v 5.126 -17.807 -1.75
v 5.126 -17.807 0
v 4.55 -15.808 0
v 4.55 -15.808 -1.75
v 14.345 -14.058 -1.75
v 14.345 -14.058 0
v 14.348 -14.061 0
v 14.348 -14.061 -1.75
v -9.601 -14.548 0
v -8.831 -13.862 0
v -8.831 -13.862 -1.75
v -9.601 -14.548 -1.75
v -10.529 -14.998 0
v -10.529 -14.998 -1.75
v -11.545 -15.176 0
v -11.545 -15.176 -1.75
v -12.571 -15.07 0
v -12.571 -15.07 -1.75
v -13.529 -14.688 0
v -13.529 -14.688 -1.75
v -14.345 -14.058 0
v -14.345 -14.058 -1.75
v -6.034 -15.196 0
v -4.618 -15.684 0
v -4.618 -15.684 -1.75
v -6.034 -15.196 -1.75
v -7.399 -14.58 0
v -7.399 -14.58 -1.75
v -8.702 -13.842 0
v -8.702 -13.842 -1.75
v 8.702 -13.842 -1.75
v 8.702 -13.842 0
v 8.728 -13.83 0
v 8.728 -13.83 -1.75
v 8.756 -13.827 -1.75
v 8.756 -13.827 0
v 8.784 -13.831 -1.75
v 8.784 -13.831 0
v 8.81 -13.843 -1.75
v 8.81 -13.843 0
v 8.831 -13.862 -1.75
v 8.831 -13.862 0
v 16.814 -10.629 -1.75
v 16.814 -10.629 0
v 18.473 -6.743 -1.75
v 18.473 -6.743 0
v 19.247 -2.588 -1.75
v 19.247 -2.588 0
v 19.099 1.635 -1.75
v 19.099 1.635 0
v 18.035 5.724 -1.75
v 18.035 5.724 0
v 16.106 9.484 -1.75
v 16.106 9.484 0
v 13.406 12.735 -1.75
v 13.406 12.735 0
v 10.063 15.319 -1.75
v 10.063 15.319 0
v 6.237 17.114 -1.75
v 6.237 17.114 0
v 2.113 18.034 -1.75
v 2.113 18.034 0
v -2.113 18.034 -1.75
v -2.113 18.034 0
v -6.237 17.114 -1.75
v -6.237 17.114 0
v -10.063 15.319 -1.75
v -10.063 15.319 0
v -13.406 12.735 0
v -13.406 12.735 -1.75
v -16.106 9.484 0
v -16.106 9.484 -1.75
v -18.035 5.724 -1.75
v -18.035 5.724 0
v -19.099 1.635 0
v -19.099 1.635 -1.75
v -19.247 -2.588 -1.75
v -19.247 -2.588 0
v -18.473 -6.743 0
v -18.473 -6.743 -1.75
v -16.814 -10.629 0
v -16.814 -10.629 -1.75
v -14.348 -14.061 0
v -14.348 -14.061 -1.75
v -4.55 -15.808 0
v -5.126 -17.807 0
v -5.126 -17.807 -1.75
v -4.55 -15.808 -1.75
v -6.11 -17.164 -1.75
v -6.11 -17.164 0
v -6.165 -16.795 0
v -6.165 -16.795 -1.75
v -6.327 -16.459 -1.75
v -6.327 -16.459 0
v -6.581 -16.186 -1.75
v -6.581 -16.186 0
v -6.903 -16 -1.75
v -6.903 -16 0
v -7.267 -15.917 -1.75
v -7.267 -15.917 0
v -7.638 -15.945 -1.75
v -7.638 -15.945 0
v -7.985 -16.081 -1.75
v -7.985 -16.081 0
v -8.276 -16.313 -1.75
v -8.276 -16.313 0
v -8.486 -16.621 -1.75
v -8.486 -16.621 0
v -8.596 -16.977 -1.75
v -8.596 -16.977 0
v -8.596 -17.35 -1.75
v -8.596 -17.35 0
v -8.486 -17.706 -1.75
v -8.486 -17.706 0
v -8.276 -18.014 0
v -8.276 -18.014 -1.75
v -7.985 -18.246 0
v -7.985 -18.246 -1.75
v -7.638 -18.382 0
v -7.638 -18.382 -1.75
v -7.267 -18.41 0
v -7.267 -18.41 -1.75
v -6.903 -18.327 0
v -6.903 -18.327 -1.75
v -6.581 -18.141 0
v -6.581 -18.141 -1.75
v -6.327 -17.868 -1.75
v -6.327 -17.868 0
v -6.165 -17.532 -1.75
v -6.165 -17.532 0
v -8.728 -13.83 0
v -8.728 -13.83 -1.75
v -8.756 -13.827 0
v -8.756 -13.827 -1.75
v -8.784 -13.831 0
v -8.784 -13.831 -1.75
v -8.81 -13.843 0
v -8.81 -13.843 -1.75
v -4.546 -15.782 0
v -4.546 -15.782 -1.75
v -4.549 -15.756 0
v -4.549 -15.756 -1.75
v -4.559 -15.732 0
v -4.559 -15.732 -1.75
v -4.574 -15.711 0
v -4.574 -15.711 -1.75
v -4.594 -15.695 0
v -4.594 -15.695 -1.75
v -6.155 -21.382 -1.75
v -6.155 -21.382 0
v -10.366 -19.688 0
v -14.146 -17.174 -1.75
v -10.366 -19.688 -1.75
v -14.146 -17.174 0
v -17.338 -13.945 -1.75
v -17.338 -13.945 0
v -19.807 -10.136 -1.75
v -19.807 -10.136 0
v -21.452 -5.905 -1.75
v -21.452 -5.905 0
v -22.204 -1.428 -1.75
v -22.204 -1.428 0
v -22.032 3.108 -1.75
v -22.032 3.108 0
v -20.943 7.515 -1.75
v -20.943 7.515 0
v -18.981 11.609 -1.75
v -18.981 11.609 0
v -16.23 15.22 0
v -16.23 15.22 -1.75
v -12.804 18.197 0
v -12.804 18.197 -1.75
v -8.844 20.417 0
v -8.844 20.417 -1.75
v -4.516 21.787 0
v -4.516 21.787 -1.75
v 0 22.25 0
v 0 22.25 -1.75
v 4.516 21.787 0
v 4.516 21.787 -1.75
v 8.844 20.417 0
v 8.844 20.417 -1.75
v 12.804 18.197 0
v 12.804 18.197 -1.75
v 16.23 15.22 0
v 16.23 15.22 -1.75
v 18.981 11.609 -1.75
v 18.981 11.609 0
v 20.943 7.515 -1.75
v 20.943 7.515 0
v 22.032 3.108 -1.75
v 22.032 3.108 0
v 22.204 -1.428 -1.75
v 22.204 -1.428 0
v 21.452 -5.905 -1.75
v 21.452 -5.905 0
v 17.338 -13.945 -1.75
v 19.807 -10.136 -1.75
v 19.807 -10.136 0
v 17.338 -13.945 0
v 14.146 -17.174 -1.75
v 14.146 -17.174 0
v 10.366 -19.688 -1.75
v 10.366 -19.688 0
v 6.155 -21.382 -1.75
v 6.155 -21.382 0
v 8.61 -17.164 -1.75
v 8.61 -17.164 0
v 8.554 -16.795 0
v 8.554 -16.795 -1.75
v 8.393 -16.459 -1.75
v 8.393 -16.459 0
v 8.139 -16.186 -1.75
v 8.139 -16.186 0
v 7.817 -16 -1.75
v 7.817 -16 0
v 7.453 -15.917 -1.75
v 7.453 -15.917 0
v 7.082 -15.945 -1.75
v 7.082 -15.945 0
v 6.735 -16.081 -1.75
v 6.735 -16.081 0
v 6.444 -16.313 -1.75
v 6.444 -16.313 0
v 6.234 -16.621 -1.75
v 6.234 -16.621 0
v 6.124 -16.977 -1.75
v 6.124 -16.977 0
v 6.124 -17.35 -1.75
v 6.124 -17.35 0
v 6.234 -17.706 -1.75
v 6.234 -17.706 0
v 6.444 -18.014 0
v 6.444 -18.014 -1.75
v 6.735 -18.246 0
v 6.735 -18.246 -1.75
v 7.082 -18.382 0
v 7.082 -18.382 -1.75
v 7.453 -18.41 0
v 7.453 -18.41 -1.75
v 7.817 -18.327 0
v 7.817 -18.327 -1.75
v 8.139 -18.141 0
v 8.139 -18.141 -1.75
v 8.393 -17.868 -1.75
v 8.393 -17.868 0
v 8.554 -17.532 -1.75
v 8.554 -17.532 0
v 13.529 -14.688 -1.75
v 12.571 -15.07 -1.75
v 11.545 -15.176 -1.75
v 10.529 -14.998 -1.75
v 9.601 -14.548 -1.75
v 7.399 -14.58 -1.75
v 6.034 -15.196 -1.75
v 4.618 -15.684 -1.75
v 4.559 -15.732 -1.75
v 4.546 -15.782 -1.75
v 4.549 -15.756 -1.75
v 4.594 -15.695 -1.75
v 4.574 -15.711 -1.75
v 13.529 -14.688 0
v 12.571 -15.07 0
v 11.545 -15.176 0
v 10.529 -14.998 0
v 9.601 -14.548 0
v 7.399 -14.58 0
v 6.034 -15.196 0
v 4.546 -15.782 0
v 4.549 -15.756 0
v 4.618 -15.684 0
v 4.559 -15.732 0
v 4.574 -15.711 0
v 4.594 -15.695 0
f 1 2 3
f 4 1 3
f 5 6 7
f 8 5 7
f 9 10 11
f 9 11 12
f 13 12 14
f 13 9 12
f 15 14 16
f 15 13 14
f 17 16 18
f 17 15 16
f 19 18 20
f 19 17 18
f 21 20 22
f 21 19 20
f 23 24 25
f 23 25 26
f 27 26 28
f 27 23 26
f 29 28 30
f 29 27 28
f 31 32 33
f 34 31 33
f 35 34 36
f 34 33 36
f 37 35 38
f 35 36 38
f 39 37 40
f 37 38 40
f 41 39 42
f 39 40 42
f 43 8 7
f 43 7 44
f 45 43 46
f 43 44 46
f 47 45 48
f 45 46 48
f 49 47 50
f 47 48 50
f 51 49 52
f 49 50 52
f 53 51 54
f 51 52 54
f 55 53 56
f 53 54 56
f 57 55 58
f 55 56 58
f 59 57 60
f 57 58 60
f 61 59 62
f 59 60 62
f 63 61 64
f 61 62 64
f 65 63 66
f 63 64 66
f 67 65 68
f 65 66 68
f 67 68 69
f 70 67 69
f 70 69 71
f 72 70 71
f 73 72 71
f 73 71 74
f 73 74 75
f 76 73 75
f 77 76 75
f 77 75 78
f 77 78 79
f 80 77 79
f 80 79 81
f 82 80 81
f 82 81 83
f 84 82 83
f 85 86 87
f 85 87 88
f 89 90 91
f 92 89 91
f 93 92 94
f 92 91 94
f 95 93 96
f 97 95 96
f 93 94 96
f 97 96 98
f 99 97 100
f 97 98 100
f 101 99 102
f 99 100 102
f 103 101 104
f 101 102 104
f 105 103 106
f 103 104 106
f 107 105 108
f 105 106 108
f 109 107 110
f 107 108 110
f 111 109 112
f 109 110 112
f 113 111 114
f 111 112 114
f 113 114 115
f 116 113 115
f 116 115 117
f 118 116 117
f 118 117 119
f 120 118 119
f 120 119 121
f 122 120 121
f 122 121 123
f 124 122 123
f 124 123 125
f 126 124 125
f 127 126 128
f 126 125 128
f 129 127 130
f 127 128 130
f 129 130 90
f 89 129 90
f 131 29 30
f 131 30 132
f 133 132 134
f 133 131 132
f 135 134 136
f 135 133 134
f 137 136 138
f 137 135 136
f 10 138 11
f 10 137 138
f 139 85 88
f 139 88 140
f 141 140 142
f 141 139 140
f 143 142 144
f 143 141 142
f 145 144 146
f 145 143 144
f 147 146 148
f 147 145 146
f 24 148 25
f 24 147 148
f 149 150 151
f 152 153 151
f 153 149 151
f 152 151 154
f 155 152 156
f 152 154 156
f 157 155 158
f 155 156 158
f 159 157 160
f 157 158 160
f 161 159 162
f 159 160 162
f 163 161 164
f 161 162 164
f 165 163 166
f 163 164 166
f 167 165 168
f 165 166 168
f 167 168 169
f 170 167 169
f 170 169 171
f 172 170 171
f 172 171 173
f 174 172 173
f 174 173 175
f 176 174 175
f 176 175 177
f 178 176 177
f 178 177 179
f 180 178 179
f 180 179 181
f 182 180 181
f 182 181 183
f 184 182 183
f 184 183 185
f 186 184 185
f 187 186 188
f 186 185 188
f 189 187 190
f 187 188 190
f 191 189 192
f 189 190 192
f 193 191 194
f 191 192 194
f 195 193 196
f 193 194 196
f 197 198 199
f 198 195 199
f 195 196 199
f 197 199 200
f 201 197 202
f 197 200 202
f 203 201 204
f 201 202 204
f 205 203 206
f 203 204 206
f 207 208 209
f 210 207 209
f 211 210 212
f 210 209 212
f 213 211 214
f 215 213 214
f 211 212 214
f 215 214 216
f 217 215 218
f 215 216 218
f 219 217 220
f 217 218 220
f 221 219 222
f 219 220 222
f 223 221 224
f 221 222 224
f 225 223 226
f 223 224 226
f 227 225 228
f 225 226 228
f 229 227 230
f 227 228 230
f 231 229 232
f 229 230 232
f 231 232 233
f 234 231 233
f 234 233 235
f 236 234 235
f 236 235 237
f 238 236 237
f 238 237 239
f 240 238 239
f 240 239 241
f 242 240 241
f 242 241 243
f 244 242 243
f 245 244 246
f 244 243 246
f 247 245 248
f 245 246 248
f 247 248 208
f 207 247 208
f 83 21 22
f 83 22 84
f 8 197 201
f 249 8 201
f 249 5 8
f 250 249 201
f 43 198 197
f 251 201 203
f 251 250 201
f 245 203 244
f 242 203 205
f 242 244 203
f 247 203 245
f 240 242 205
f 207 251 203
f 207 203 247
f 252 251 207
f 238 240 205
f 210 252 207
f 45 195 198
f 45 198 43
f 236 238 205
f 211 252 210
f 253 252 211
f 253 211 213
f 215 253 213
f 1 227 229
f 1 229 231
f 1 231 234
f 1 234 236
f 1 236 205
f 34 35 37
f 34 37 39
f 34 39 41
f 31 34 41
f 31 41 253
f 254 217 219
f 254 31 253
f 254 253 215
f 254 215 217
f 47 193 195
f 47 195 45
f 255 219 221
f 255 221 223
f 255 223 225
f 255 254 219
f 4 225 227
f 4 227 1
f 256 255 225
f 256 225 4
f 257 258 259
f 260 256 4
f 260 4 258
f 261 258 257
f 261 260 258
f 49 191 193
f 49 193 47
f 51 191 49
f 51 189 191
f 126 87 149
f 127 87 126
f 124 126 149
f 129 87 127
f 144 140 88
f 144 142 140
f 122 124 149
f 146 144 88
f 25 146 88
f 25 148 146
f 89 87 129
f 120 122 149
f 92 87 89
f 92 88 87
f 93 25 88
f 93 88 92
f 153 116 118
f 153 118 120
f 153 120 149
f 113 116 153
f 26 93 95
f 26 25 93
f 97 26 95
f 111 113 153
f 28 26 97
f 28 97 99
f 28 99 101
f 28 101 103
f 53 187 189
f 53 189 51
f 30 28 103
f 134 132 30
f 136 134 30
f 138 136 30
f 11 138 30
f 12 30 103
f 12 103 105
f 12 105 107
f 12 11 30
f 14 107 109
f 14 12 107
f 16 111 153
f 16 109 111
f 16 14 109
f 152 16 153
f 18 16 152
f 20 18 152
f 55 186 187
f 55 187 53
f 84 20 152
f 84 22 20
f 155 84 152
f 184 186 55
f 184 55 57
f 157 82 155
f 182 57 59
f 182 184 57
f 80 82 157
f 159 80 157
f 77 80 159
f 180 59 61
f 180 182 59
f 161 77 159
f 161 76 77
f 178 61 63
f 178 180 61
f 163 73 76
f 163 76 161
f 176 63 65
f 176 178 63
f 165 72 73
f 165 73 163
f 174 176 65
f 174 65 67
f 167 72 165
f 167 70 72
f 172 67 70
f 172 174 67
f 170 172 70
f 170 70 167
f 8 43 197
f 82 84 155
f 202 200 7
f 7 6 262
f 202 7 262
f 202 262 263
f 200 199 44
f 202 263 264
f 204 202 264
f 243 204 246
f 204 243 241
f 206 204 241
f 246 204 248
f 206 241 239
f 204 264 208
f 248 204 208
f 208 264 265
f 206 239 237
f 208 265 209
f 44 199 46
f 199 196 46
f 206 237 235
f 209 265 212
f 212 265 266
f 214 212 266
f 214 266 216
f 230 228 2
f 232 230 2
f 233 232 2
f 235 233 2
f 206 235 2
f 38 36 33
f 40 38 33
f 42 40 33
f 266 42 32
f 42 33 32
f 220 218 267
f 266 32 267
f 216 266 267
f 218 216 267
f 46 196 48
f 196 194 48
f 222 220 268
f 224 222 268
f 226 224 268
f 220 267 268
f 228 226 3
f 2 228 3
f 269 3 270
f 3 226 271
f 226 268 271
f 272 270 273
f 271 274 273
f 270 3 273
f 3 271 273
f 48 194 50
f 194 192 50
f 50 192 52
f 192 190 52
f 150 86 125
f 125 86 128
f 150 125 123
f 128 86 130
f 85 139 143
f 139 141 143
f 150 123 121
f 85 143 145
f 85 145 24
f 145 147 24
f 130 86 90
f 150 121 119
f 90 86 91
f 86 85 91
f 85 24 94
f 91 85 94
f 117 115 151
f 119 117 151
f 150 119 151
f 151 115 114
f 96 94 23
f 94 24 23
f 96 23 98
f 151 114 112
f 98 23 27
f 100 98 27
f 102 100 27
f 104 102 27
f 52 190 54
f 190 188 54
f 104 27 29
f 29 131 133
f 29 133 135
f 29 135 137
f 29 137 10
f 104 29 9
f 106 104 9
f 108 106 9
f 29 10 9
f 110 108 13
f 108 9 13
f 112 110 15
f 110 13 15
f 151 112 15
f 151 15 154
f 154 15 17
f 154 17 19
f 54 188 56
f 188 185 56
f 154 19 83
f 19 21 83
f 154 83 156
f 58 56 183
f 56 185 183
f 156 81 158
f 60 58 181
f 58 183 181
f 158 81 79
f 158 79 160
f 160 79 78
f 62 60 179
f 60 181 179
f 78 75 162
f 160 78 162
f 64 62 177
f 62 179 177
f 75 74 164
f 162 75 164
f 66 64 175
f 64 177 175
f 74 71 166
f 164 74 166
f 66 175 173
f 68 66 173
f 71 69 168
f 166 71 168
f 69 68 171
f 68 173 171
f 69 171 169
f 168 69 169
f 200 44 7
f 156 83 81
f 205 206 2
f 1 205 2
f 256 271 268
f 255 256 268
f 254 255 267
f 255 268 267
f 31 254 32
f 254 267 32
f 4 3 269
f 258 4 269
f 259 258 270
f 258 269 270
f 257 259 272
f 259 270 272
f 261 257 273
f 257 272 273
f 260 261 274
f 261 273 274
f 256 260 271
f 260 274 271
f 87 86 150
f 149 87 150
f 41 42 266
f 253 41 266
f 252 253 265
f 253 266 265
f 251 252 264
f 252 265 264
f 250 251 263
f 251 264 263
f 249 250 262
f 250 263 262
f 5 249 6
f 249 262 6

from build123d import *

# Parameters (mm, degrees)
BODYSKE_R    = 1.25
BODY_DEPTH   = 1.75
MODLUGSKE_R  = 1.25
MODLUG_DEPTH = 1.75


with BuildPart() as part:
    # BodySke → Body (new body)
    with BuildSketch(Plane.XY):
        with BuildLine():
            Line((6.15473831, -21.381807602), (5.12564003, -17.806678924))
            ThreePointArc((5.12564003, -17.806678924), (6.26268227, -15.113739212), (9.13415023, -15.660969609))
            ThreePointArc((9.13415023, -15.660969609), (10.710697658, -16.474976548), (12.402371606, -15.939861288))
            ThreePointArc((12.402371606, -15.939861288), (0, 18.15), (-12.402371606, -15.939861288))
            ThreePointArc((-12.402371606, -15.939861288), (-10.710697658, -16.474976548), (-9.13415023, -15.660969609))
            ThreePointArc((-9.13415023, -15.660969609), (-6.26268227, -15.113739212), (-5.12564003, -17.806678924))
            Line((-5.12564003, -17.806678924), (-6.15473831, -21.381807602))
            ThreePointArc((-6.15473831, -21.381807602), (0, 22.25), (6.15473831, -21.381807602))
        make_face()
        with Locations((7.359918802, -17.163543347)):
            Circle(BODYSKE_R, mode=Mode.SUBTRACT)
        with Locations((-7.359918802, -17.163543347)):
            Circle(BODYSKE_R, mode=Mode.SUBTRACT)
    extrude(amount=-BODY_DEPTH)

    # ModLugSke → ModLug (add, through all)
    with BuildSketch(Plane.XY):
        with BuildLine():
            Line((6.15473831, -21.381807602), (4.550273009, -15.80783083))
            ThreePointArc((4.550273009, -15.80783083), (4.558712973, -15.732043553), (4.618125604, -15.684241005))
            ThreePointArc((4.618125604, -15.684241005), (6.723383791, -14.903644199), (8.701845472, -13.841979099))
            ThreePointArc((8.701845472, -13.841979099), (8.770273624, -13.827802373), (8.831276161, -13.861891696))
            ThreePointArc((8.831276161, -13.861891696), (11.5450024, -15.176170025), (14.345137247, -14.057741457))
            Line((14.345137247, -14.057741457), (15.89150871, -15.573132342))
            ThreePointArc((15.89150871, -15.573132342), (11.399317041, -19.108062984), (6.15473831, -21.381807602))
        make_face()
        with Locations((7.359918802, -17.163543347)):
            Circle(MODLUGSKE_R, mode=Mode.SUBTRACT)
        with BuildLine():
            Line((-6.15473831, -21.381807602), (-4.550273009, -15.80783083))
            ThreePointArc((-4.550273009, -15.80783083), (-4.558712973, -15.732043553), (-4.618125604, -15.684241005))
            ThreePointArc((-4.618125604, -15.684241005), (-6.723383791, -14.903644199), (-8.701845472, -13.841979099))
            ThreePointArc((-8.701845472, -13.841979099), (-8.770273624, -13.827802373), (-8.831276161, -13.861891696))
            ThreePointArc((-8.831276161, -13.861891696), (-11.5450024, -15.176170025), (-14.345137247, -14.057741457))
            Line((-14.345137247, -14.057741457), (-15.89150871, -15.573132342))
            ThreePointArc((-15.89150871, -15.573132342), (-11.399317041, -19.108062984), (-6.15473831, -21.381807602))
        make_face()
        with Locations((-7.359918802, -17.163543347)):
            Circle(MODLUGSKE_R, mode=Mode.SUBTRACT)
    extrude(amount=-MODLUG_DEPTH)


solid = part.part
